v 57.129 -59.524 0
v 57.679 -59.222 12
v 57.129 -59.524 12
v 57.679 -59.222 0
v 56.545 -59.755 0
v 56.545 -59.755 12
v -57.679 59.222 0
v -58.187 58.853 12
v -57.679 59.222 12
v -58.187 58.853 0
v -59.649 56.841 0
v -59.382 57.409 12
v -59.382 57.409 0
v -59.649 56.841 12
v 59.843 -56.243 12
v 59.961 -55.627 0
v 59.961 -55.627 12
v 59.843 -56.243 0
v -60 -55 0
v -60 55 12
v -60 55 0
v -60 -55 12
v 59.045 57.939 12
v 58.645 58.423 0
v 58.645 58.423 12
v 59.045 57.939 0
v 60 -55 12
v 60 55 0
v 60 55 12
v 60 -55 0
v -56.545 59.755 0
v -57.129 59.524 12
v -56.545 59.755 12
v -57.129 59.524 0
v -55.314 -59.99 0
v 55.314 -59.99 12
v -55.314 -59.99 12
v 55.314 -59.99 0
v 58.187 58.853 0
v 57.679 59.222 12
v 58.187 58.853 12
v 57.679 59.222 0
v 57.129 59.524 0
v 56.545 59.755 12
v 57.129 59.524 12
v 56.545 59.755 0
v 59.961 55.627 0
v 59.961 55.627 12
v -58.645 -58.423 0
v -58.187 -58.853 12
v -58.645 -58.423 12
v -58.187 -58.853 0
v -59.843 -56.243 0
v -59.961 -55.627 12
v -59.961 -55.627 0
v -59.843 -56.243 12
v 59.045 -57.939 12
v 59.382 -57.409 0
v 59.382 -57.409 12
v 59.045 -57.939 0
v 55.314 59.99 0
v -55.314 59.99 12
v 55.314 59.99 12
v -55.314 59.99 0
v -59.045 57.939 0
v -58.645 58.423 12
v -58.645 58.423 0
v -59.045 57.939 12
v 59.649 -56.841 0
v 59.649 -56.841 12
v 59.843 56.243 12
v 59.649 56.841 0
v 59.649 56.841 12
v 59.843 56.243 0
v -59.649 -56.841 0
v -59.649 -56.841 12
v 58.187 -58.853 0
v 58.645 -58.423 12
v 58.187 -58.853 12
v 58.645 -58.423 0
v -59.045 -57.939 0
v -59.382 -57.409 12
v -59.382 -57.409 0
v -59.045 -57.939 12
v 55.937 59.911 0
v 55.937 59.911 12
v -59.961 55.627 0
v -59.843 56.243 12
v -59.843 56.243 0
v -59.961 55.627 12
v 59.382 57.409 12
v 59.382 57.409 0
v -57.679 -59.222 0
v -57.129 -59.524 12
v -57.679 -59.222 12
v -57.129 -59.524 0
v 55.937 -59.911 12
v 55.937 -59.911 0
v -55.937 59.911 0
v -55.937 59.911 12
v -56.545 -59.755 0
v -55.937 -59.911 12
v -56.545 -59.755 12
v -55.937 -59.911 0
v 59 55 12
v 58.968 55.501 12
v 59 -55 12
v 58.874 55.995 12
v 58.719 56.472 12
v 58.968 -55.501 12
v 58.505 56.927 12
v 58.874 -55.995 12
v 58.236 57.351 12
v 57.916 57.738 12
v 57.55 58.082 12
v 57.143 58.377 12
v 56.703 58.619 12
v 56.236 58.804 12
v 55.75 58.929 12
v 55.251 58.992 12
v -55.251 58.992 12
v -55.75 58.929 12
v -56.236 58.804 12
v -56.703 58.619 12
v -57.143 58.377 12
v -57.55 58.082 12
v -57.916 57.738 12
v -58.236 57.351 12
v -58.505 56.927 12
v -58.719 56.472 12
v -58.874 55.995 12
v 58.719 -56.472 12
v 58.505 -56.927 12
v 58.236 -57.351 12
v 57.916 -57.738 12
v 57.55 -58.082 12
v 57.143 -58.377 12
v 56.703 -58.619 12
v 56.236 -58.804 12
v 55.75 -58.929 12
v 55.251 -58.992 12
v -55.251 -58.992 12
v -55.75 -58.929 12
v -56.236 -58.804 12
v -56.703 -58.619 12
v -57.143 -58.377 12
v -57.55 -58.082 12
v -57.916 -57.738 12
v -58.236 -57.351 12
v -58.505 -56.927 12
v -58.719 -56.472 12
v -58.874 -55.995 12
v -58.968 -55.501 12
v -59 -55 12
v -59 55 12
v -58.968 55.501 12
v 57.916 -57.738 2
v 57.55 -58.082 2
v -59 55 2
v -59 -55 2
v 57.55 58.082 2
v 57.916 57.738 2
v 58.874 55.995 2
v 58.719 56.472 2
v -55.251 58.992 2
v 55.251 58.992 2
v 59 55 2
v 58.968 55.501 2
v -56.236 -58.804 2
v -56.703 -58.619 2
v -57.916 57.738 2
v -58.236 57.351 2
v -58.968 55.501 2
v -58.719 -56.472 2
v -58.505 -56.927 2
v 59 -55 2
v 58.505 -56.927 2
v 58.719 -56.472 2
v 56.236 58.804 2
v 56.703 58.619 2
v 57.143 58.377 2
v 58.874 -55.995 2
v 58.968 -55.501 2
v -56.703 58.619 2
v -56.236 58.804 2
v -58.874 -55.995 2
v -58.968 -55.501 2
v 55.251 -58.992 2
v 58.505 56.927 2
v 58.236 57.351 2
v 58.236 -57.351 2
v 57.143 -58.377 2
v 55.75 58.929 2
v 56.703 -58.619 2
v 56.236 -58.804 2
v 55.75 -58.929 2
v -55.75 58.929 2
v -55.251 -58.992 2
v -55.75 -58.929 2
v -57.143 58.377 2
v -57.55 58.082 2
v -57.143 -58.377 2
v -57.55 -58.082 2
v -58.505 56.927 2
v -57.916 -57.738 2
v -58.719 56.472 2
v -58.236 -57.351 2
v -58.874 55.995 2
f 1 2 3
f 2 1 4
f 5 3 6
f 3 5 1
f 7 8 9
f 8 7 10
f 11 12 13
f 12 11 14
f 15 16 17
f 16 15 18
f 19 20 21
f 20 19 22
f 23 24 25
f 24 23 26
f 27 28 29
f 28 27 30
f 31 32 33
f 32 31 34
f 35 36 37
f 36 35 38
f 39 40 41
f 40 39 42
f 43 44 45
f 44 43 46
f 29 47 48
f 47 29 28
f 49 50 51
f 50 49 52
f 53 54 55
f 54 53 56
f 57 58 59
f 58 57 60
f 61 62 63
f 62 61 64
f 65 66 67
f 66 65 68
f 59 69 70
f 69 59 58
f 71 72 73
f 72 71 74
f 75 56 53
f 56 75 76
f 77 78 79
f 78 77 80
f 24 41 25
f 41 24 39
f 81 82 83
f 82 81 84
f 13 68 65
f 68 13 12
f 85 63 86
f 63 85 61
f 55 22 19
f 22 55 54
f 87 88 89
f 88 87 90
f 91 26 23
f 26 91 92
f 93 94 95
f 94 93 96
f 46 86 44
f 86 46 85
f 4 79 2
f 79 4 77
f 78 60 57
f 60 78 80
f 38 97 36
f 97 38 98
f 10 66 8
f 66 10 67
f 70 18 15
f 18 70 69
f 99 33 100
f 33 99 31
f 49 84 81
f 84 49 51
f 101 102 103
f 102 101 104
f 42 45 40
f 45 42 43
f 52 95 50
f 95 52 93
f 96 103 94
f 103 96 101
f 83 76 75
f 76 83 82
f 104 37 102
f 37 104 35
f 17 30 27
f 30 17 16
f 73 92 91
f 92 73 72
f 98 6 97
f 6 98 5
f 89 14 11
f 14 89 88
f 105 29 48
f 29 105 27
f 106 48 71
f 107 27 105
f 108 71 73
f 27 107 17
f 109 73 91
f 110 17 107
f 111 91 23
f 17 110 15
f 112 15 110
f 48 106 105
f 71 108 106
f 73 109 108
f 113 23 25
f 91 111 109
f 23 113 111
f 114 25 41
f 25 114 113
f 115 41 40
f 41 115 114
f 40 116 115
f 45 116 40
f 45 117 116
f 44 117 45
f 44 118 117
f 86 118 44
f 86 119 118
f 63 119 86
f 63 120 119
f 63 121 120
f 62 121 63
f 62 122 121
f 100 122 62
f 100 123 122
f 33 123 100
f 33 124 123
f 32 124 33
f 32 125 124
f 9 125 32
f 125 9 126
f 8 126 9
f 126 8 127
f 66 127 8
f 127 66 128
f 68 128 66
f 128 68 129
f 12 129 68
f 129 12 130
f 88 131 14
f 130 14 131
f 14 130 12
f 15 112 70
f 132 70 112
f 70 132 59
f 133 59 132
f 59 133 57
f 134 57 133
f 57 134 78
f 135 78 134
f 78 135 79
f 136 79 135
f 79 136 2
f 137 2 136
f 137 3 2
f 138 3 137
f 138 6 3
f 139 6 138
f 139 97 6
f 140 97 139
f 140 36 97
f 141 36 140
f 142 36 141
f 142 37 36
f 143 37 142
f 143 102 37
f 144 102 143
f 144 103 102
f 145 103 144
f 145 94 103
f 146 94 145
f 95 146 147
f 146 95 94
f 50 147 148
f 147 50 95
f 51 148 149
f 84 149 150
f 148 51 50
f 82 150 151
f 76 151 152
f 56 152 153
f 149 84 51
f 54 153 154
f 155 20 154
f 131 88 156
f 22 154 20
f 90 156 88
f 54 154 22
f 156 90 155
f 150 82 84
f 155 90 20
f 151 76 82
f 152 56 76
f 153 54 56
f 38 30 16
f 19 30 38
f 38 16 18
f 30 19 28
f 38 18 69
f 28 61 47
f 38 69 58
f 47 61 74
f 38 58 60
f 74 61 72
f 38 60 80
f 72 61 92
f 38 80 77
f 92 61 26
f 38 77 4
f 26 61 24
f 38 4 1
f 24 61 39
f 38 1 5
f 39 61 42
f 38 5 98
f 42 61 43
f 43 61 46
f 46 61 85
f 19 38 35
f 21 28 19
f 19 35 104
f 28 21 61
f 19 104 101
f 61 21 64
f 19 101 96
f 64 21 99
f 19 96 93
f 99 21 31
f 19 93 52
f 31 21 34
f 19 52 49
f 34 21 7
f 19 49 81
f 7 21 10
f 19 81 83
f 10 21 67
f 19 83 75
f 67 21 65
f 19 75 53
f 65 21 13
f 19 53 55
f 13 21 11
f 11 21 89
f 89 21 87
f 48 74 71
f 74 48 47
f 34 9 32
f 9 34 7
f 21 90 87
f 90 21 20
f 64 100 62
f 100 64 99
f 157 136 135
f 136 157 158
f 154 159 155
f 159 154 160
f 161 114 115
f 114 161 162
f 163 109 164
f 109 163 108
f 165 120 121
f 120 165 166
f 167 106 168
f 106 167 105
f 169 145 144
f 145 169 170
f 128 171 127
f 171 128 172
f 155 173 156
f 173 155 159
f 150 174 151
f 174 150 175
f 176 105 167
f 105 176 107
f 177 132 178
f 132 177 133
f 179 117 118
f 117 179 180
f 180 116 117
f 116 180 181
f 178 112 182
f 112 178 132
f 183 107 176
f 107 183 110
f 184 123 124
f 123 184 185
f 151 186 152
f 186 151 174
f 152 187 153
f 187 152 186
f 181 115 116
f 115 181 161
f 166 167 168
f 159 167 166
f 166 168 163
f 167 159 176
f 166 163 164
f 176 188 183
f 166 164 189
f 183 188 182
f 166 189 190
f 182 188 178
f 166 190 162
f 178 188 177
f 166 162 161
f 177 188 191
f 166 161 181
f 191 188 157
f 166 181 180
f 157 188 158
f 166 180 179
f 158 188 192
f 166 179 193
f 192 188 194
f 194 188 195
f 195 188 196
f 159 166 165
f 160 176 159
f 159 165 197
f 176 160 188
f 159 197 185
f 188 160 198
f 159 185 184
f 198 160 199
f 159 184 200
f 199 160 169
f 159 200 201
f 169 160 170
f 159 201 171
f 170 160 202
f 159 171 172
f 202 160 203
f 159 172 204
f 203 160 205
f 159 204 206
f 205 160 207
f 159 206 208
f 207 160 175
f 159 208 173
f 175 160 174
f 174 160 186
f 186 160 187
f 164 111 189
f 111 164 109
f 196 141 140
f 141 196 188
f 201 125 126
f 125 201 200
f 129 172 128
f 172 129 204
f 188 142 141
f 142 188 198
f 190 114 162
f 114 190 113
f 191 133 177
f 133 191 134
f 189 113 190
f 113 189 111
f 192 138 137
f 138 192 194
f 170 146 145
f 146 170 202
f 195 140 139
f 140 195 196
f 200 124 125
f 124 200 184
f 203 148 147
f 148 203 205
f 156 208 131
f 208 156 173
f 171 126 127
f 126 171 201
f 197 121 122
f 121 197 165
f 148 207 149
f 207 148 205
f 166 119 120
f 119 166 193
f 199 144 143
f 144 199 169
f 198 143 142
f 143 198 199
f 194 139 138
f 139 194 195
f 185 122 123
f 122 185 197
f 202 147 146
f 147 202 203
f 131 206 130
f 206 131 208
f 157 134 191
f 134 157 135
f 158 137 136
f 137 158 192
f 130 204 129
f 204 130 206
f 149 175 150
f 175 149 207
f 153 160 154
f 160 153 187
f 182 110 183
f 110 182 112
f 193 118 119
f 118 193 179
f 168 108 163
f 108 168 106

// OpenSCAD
$fn = 50;


difference() {
	union() {
		hull() {
			translate(v = [-55.0000000000, 55.0000000000, 0]) {
				cylinder(h = 12, r = 5);
			}
			translate(v = [55.0000000000, 55.0000000000, 0]) {
				cylinder(h = 12, r = 5);
			}
			translate(v = [-55.0000000000, -55.0000000000, 0]) {
				cylinder(h = 12, r = 5);
			}
			translate(v = [55.0000000000, -55.0000000000, 0]) {
				cylinder(h = 12, r = 5);
			}
		}
	}
	union() {
		translate(v = [0, 0, 2]) {
			hull() {
				translate(v = [-55.0000000000, 55.0000000000, 0]) {
					cylinder(h = 10, r = 4);
				}
				translate(v = [55.0000000000, 55.0000000000, 0]) {
					cylinder(h = 10, r = 4);
				}
				translate(v = [-55.0000000000, -55.0000000000, 0]) {
					cylinder(h = 10, r = 4);
				}
				translate(v = [55.0000000000, -55.0000000000, 0]) {
					cylinder(h = 10, r = 4);
				}
			}
		}
	}
}
